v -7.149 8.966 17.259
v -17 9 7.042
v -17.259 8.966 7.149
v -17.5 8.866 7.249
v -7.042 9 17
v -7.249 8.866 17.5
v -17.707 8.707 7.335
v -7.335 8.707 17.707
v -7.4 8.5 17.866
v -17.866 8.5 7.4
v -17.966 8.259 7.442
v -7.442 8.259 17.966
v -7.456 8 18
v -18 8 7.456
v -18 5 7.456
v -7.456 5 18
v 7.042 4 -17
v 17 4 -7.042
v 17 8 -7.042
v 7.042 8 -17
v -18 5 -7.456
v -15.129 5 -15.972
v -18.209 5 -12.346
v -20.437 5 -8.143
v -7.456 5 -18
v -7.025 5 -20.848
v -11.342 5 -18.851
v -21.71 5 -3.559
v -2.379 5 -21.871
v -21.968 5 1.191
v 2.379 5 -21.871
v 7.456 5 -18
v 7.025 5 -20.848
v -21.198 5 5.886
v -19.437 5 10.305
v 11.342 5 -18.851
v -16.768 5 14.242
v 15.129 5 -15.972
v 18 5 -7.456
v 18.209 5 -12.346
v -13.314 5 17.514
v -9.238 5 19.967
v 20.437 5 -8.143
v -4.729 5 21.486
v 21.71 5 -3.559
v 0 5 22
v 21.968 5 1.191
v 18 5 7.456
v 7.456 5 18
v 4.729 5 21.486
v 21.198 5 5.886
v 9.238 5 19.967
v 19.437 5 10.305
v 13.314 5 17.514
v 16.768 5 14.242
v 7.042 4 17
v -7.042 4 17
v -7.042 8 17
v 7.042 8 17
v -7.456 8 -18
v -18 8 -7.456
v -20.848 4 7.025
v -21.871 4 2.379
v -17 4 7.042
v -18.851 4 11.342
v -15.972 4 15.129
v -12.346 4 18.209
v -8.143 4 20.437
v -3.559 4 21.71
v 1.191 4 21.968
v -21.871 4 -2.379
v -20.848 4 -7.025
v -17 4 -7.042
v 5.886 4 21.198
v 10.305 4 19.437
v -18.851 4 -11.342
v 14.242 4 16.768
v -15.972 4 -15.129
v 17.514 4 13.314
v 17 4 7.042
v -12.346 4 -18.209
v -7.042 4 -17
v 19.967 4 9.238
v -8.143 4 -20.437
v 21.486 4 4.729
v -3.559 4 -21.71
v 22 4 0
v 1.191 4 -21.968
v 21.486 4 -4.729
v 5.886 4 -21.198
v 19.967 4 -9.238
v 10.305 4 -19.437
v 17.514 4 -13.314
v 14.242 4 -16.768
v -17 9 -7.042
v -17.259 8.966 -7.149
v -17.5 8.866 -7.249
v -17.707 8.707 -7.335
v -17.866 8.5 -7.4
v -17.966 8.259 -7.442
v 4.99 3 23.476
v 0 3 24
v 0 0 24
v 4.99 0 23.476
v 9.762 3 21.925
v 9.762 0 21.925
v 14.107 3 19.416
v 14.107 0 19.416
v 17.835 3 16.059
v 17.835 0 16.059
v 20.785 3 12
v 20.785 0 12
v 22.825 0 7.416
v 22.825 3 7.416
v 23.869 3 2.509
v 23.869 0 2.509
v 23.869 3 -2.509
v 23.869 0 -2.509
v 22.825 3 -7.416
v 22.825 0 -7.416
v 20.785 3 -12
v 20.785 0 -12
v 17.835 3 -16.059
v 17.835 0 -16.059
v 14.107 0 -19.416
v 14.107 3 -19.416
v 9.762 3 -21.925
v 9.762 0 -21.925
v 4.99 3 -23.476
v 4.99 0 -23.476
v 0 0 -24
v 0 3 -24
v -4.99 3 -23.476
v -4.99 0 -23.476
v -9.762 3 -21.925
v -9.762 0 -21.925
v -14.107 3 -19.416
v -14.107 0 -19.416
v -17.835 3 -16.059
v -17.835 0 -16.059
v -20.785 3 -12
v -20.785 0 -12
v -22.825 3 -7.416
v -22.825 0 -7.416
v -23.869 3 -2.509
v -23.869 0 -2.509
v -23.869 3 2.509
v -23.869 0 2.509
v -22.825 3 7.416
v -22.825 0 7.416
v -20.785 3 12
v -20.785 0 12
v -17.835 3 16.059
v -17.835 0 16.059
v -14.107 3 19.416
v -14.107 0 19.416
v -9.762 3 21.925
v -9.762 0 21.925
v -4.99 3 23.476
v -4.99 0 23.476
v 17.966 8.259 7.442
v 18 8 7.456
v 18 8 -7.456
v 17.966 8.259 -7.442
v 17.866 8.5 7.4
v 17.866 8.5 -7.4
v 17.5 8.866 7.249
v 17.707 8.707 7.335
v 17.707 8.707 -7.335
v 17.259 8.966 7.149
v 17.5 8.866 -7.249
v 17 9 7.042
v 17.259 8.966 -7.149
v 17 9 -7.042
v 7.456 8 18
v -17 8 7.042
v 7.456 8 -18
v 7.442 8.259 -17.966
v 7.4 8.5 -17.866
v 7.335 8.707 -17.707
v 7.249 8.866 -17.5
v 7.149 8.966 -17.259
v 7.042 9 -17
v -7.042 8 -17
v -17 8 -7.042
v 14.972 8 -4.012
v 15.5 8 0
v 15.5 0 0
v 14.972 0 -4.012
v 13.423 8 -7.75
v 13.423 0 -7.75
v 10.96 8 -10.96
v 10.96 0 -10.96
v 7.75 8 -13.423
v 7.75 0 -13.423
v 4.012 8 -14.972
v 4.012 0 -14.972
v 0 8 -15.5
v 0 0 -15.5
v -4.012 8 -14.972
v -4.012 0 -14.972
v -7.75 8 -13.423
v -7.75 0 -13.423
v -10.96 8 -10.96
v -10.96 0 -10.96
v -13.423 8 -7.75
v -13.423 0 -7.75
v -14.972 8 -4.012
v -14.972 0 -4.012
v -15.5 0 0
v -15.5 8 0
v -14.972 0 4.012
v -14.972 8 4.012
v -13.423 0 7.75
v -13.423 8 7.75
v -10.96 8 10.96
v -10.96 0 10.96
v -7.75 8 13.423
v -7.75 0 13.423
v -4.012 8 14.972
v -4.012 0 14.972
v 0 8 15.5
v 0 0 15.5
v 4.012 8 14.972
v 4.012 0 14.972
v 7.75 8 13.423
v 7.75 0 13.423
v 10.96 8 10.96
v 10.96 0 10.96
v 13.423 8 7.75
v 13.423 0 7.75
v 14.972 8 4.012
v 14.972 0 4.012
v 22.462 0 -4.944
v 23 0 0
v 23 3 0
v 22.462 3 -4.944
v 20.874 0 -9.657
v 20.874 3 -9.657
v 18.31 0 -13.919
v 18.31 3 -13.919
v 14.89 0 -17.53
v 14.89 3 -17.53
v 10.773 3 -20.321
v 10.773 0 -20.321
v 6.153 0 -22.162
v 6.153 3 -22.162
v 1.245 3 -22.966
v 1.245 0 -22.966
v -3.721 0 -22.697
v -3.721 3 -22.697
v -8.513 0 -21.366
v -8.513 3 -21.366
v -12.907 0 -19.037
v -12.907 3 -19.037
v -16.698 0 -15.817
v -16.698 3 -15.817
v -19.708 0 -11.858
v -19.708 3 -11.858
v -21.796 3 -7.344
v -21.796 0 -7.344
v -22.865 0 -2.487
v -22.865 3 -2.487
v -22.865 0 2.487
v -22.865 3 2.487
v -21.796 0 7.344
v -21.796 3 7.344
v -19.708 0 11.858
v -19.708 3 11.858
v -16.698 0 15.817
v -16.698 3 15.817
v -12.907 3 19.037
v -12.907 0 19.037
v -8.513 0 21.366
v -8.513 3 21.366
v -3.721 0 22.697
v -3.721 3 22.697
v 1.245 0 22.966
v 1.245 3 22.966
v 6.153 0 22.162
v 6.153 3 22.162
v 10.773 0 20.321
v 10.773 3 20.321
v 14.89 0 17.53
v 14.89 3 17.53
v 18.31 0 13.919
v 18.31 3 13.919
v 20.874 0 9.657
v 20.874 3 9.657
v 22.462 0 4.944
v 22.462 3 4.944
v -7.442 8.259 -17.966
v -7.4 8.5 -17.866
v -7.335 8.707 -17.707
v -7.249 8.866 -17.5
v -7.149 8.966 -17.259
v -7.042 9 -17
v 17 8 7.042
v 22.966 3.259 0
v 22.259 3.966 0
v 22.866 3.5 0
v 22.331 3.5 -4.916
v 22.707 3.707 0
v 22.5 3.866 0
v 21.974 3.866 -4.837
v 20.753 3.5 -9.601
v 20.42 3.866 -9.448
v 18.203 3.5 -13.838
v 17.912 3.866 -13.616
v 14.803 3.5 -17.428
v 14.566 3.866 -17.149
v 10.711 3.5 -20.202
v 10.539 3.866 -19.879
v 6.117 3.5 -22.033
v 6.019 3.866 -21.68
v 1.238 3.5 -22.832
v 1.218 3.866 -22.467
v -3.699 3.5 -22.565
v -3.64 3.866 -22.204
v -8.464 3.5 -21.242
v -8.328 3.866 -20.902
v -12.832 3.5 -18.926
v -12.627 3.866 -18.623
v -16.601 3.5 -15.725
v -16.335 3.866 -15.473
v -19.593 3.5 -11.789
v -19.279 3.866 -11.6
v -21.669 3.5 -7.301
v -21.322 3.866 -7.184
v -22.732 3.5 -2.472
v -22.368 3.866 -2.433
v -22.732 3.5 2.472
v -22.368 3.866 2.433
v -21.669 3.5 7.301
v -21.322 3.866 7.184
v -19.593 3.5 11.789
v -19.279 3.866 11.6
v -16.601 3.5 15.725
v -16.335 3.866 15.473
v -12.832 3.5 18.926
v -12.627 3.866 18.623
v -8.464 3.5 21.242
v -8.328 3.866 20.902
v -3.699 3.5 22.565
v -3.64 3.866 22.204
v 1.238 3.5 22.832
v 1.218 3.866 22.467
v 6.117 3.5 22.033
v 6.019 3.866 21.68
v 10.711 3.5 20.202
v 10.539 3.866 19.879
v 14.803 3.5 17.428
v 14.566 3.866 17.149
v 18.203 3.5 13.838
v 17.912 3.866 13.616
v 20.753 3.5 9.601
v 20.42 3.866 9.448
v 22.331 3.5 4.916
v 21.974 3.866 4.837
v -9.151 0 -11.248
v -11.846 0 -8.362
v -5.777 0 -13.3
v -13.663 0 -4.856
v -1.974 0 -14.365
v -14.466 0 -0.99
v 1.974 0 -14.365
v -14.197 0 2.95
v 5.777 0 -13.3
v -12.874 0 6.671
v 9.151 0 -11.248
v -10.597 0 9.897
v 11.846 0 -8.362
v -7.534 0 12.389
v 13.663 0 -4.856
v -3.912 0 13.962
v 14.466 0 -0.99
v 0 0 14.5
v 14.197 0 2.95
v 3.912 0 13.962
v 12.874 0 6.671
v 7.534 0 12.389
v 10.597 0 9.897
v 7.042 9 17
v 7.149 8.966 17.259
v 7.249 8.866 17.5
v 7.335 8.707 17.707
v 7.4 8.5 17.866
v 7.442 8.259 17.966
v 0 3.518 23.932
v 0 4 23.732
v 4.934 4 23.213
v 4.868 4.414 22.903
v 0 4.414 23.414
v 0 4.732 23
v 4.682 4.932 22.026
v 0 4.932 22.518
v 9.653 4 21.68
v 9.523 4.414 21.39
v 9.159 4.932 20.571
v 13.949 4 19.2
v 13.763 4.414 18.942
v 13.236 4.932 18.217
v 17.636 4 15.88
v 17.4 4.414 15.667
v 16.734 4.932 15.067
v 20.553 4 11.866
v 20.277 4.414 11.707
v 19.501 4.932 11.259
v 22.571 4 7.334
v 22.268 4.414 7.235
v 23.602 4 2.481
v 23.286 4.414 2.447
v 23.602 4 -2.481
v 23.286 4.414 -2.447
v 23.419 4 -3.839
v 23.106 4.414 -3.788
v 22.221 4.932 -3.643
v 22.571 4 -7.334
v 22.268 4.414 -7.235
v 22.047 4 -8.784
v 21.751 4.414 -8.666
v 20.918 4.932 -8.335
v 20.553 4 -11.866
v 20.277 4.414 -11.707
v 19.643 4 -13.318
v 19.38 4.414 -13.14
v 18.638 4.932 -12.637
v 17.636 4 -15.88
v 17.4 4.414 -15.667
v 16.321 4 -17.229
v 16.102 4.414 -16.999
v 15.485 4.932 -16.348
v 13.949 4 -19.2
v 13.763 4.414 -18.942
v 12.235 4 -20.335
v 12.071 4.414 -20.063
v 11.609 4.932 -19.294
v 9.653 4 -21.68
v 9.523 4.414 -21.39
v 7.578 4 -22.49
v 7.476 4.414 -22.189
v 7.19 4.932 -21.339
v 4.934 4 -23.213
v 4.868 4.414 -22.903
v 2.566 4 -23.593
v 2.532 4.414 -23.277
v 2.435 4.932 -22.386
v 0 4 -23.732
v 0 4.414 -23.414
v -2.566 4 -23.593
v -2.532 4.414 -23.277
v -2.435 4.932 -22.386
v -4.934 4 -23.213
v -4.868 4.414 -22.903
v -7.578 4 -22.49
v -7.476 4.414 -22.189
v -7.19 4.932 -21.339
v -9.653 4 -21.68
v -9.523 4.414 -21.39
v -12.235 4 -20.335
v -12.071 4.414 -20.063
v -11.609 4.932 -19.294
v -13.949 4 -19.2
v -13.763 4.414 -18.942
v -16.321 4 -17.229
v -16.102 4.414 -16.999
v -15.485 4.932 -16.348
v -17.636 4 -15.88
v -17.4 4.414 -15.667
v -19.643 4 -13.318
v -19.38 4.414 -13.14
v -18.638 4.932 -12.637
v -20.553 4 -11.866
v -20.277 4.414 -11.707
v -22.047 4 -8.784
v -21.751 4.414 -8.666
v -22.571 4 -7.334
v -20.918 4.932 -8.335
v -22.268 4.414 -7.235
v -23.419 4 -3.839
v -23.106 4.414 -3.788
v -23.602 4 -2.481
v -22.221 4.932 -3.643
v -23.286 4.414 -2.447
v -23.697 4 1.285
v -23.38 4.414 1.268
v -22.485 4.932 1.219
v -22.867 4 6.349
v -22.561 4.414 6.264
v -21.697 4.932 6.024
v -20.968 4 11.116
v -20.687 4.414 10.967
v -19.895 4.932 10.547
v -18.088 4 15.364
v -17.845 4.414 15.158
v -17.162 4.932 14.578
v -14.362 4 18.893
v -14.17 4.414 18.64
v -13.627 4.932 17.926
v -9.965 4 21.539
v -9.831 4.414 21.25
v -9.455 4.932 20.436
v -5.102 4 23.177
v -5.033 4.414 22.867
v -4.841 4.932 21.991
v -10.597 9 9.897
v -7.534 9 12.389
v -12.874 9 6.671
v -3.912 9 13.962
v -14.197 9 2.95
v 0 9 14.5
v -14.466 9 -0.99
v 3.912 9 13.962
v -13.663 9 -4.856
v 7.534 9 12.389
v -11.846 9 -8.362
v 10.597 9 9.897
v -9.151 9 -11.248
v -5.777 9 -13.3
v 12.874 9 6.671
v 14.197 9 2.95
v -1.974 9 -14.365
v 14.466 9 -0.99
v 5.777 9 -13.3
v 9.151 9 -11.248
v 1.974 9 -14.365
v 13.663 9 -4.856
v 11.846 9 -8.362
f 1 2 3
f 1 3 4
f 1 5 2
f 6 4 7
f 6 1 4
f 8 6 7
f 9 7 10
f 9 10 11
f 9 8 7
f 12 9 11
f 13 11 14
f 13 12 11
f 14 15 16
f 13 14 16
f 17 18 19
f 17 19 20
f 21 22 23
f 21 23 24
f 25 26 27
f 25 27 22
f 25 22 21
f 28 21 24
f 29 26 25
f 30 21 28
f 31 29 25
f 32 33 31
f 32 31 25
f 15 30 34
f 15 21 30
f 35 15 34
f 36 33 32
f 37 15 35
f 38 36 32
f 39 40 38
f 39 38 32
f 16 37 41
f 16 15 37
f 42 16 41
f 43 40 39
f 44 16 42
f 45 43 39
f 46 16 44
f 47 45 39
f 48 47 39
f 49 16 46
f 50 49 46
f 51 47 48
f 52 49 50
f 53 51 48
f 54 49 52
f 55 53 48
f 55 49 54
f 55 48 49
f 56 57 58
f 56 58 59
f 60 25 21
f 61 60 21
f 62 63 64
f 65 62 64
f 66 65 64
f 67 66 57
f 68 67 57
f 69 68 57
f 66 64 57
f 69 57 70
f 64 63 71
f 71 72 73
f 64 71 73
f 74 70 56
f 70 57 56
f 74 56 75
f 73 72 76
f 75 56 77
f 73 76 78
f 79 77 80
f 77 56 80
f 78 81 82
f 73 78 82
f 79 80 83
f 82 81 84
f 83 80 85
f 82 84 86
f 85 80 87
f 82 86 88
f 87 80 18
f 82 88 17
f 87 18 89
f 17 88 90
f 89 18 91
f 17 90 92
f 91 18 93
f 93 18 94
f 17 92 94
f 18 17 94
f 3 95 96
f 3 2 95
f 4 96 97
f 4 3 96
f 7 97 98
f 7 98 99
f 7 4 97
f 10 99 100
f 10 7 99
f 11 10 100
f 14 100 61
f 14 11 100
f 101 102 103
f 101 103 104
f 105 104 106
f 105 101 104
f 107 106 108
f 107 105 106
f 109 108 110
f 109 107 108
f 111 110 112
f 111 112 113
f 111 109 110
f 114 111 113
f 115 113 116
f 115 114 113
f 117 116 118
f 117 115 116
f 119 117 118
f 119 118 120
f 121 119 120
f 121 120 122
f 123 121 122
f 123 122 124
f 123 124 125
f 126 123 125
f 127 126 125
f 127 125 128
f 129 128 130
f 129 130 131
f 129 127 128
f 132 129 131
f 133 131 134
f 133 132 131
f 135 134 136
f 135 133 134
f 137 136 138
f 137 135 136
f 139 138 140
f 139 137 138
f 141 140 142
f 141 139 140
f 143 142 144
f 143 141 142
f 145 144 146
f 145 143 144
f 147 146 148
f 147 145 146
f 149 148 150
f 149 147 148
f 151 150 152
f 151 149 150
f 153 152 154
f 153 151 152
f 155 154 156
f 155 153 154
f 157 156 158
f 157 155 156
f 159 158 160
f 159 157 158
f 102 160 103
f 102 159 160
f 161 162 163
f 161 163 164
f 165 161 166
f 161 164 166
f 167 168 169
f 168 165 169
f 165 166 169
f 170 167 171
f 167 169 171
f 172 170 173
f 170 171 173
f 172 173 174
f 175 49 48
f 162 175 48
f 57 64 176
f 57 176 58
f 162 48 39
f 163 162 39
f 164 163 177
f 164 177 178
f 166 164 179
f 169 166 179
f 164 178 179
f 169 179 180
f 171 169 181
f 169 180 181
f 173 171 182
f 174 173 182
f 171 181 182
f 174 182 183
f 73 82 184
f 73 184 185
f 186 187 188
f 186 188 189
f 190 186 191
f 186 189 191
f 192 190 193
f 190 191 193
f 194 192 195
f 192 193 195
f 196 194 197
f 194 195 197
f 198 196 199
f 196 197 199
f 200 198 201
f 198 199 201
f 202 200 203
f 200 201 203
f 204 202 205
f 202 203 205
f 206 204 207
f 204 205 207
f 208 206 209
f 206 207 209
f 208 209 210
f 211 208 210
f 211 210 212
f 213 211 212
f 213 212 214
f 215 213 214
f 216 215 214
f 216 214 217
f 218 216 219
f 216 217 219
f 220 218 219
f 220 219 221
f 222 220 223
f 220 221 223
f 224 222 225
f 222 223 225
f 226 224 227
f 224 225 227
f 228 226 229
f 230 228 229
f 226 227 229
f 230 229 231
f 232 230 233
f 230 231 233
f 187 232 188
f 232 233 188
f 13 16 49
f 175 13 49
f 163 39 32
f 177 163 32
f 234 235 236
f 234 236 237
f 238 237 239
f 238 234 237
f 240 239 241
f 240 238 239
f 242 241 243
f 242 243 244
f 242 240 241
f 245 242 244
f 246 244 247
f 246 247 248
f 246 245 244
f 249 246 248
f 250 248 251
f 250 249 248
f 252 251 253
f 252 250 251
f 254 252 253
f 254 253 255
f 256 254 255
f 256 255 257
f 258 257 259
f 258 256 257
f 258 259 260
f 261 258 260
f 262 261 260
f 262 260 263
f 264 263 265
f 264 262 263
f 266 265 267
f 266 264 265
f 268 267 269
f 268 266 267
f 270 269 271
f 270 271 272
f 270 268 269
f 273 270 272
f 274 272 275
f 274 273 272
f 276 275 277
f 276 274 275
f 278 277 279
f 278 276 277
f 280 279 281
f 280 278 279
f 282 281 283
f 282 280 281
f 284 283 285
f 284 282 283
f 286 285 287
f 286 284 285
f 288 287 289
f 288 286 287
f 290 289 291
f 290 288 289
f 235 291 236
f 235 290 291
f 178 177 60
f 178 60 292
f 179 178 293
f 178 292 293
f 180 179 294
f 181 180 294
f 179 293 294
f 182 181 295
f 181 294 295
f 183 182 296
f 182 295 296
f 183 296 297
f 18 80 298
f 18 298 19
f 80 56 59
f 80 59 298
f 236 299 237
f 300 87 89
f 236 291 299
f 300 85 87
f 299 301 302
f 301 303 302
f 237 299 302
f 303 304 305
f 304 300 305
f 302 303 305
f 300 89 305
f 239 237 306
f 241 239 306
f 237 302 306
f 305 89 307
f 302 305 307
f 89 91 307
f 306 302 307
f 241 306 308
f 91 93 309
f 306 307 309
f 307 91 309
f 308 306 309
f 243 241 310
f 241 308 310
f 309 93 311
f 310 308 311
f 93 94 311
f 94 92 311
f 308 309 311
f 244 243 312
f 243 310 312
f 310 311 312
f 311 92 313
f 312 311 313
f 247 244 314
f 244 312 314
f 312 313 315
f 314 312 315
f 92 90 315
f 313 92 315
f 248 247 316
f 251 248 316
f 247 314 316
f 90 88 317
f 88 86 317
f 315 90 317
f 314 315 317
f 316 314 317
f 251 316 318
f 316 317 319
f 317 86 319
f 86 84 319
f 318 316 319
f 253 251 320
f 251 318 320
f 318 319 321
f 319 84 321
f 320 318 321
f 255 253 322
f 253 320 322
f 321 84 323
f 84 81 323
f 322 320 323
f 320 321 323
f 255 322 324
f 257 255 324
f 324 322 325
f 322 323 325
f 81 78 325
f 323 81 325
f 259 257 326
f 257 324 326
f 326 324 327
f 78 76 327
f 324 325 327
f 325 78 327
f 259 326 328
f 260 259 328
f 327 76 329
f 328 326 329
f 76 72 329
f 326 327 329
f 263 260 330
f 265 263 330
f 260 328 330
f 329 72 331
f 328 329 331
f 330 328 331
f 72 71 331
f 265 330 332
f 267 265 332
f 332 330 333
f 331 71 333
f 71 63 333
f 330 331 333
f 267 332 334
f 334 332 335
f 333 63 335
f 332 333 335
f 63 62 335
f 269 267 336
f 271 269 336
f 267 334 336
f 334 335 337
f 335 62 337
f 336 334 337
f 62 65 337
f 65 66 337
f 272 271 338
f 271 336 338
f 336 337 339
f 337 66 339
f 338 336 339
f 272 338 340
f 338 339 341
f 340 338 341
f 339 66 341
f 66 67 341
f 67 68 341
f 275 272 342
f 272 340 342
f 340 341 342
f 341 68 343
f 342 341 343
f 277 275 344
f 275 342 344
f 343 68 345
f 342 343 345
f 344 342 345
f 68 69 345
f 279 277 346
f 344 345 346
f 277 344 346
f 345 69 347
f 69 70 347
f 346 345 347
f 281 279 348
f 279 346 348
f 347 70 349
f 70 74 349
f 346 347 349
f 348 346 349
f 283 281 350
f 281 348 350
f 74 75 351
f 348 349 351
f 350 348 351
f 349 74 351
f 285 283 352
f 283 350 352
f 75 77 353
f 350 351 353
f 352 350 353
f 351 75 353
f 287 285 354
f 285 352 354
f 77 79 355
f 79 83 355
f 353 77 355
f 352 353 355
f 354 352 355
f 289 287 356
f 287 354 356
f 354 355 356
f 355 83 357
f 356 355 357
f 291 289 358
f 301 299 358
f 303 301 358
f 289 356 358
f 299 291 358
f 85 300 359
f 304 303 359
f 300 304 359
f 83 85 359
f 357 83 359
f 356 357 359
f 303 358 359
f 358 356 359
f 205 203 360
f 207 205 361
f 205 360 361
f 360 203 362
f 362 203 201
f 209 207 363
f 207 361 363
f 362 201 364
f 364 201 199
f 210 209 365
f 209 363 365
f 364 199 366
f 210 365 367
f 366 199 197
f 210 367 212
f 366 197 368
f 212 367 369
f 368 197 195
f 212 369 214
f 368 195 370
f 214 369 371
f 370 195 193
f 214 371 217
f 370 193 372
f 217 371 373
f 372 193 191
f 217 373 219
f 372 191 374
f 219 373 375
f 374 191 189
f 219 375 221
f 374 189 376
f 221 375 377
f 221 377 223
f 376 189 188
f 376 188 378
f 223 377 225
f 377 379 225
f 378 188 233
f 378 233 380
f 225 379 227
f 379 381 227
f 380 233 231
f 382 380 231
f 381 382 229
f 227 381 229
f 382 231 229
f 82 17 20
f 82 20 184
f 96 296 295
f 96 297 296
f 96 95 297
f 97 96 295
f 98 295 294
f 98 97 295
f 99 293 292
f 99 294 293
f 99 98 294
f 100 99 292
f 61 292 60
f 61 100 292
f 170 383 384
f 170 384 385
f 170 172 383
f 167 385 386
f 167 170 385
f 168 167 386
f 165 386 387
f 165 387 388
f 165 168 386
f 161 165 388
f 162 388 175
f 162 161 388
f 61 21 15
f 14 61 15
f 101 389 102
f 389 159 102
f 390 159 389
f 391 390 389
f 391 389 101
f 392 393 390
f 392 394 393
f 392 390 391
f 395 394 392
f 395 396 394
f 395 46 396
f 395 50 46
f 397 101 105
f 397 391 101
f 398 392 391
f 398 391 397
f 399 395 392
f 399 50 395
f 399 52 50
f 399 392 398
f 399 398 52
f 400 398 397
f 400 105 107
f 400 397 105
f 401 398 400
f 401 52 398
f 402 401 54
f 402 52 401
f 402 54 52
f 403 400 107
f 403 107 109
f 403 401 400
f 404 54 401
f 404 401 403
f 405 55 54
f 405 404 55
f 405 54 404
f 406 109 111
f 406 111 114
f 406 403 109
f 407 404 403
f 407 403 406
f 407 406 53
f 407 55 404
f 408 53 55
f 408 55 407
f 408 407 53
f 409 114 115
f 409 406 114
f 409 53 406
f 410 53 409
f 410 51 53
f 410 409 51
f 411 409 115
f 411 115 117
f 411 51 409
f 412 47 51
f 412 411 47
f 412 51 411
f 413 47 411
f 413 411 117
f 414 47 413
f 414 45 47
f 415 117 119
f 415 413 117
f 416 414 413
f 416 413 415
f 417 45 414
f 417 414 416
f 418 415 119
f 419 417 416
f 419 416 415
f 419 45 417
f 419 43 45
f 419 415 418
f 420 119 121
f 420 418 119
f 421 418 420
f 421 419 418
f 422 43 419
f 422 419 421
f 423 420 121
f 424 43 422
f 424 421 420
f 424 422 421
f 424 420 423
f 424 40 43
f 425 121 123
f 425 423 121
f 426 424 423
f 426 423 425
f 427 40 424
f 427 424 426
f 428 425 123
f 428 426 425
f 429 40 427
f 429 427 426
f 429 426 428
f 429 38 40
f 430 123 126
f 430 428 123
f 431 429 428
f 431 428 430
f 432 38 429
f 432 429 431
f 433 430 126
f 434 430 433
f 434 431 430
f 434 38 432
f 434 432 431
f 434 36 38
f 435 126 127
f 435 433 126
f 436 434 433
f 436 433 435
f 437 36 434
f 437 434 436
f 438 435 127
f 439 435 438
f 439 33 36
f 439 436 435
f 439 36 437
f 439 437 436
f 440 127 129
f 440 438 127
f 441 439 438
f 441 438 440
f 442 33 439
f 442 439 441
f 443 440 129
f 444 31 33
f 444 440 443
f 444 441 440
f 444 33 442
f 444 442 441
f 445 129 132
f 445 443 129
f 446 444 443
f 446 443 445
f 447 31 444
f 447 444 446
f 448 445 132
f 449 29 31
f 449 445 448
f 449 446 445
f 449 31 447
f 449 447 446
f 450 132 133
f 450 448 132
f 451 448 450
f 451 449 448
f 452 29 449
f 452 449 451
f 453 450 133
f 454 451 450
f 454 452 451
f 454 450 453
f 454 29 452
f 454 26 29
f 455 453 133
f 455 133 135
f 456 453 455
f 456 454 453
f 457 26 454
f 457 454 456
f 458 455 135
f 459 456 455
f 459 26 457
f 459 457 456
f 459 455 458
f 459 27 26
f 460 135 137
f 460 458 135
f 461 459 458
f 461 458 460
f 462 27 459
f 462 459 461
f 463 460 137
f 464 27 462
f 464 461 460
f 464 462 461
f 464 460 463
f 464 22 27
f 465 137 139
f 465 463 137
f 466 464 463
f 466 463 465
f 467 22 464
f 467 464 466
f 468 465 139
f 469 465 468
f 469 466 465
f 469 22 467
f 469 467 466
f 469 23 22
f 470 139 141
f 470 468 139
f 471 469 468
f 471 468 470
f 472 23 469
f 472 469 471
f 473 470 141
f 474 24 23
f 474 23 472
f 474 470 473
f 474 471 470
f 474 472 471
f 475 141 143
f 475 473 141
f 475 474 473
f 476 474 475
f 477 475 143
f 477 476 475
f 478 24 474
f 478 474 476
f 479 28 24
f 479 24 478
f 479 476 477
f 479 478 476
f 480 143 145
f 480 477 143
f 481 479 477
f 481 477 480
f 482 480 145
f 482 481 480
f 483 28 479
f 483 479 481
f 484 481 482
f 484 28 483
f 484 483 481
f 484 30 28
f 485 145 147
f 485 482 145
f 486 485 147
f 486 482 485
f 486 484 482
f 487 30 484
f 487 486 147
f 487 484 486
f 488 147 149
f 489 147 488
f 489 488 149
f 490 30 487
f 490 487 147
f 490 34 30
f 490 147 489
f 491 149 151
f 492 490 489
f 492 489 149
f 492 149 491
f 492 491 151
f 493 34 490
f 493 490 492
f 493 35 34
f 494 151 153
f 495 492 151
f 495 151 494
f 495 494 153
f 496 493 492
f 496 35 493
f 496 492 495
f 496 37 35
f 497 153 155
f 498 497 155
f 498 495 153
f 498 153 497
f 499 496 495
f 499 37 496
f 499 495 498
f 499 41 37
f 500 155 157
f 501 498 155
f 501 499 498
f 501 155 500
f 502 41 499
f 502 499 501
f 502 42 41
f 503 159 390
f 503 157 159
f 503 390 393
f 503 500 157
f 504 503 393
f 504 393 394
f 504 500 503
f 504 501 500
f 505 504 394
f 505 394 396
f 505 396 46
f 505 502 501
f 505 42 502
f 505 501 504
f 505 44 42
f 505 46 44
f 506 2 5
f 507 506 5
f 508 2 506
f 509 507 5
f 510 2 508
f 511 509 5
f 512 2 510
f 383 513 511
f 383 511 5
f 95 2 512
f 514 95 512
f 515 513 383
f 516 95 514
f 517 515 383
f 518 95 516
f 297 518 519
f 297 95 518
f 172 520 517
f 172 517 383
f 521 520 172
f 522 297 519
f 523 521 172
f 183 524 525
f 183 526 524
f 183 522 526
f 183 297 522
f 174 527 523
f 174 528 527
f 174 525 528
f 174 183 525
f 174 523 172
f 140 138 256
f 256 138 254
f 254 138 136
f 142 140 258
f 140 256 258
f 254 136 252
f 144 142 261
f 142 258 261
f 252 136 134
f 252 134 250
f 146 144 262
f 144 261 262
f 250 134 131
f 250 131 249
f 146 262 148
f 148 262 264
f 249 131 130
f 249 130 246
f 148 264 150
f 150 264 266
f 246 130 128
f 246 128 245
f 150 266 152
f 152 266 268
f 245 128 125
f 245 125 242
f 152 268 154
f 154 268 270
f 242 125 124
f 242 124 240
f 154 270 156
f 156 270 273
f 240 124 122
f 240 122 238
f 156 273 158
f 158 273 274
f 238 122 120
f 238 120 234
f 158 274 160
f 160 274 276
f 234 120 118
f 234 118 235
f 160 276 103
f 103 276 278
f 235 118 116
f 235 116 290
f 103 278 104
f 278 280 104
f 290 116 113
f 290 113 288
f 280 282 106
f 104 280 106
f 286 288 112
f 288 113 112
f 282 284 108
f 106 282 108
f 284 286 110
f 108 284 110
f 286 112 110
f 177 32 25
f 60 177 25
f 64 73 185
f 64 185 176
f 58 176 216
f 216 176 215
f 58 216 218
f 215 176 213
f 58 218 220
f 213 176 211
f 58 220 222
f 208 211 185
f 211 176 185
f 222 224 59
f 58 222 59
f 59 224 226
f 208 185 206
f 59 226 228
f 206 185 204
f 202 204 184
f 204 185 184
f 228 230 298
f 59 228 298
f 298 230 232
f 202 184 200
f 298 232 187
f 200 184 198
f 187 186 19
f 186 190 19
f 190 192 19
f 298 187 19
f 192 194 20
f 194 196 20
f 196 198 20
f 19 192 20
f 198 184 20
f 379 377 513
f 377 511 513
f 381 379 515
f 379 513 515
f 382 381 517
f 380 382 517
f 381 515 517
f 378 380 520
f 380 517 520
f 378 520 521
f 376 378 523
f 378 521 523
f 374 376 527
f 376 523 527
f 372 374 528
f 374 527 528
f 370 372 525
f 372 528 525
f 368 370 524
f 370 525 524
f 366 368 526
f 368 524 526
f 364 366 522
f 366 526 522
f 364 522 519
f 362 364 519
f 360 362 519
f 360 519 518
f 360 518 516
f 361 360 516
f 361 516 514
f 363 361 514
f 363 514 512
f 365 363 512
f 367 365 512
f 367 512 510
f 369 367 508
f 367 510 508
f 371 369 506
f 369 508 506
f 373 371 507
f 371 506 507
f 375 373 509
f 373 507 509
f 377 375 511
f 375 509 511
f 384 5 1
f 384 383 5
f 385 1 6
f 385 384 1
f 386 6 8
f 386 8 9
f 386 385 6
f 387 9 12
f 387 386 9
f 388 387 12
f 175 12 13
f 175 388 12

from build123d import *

# Parameters (mm, degrees)
SALIENTE_EXTRUIR1_DEPTH = 9
CROQUIS2_R              = 14.5
CORTAR_EXTRUIR1_DEPTH   = 28
REDONDEO1_R             = 1
CROQUIS4_R              = 24
SALIENTE_EXTRUIR2_DEPTH = 5
CROQUIS5_R              = 14.5
CORTAR_EXTRUIR2_DEPTH   = 35.307433597
REDONDEO2_R             = 2
VACIADO1_OUTLINE_R      = 23
VACIADO1_OUTLINE_R_2    = 15.5
VACIADO1_DEPTH          = 2.9999999
VACIADO1_2_OUTLINE_R    = 15.5
VACIADO1_2_DEPTH        = 8


with BuildPart() as part:
    # Croquis1 → Saliente-Extruir1 (new body)
    with BuildSketch(Plane(origin=(0, 0, 0), x_dir=(1, 0, 0), z_dir=(0, 1, 0))):
        Polygon((18, 7.455844123), (7.455844123, 18), (-7.455844123, 18), (-18, 7.455844123), (-18, -7.455844123), (-7.455844123, -18), (7.455844123, -18), (18, -7.455844123), align=None)
    extrude(amount=SALIENTE_EXTRUIR1_DEPTH)

    # Croquis2 → Cortar-Extruir1 (cut, through all)
    with BuildSketch(Plane(origin=(0, 9, 0), x_dir=(1, 0, 0), z_dir=(0, 1, 0))):
        with Locations(Location((0, 0, 0), (0, 0, 270))):
            Circle(CROQUIS2_R)
    extrude(amount=-CORTAR_EXTRUIR1_DEPTH, mode=Mode.SUBTRACT)

    # Redondeo1
    redondeo1_edges = [part.edges().sort_by_distance(p)[0] for p in [
        (0, 9, -18),
        (-12.727922061, 9, -12.727922061),
        (-18, 9, 0),
        (-12.727922061, 9, 12.727922061),
        (0, 9, 18),
        (12.727922061, 9, 12.727922061),
        (18, 9, 0),
        (12.727922061, 9, -12.727922061),
    ]]
    fillet(redondeo1_edges, radius=REDONDEO1_R)

    # Croquis4 → Saliente-Extruir2 (add)
    with BuildSketch(Plane(origin=(0, 5, 0), x_dir=(1, 0, 0), z_dir=(0, 1, 0))):
        with Locations(Location((0, 0, 0), (0, 0, 270))):
            Circle(CROQUIS4_R)
    extrude(amount=-SALIENTE_EXTRUIR2_DEPTH)

    # Croquis5 → Cortar-Extruir2 (cut, through all)
    with BuildSketch(Plane(origin=(0, 5, 0), x_dir=(1, 0, 0), z_dir=(0, 1, 0))):
        with Locations(Location((0, 0, 0), (0, 0, 270))):
            Circle(CROQUIS5_R)
    extrude(amount=-CORTAR_EXTRUIR2_DEPTH, mode=Mode.SUBTRACT)

    # Redondeo2
    redondeo2_edges = [part.edges().sort_by_distance(p)[0] for p in [
        (0, 5, -24),
    ]]
    fillet(redondeo2_edges, radius=REDONDEO2_R)

    # Vaciado1: read off the stored shape, not the designer's step
    # Vaciado1 outline → Vaciado1 (cut)
    with BuildSketch(Plane(origin=(0, 0, 0), x_dir=(1, 0, 0), z_dir=(0, 1, 0))):
        Circle(VACIADO1_OUTLINE_R)
        Circle(VACIADO1_OUTLINE_R_2, mode=Mode.SUBTRACT)
    extrude(amount=VACIADO1_DEPTH, mode=Mode.SUBTRACT)

    # Vaciado1 2 outline → Vaciado1 2 (cut)
    with BuildSketch(Plane(origin=(0, 0, 0), x_dir=(1, 0, 0), z_dir=(0, 1, 0))):
        Polygon((17, -7.04163056), (17, 7.04163056), (7.04163056, 17), (-7.04163056, 17), (-17, 7.04163056), (-17, -7.04163056), (-7.04163056, -17), (7.04163056, -17), align=None)
        Circle(VACIADO1_2_OUTLINE_R, mode=Mode.SUBTRACT)
    extrude(amount=VACIADO1_2_DEPTH, mode=Mode.SUBTRACT)

    # Vaciado1 3 outline → Vaciado1 3 (revolve, cut)
    with BuildSketch(Plane.XY):
        with BuildLine():
            Line((17, 2.9999999), (23, 3))
            ThreePointArc((23, 3), (22.707106781, 3.707106781), (22, 4))
            Line((22, 4), (17, 4))
            Line((17, 4), (17, 2.9999999))
        make_face()
    revolve(axis=Axis((0, 0, 0), (0, 1, 0)), mode=Mode.SUBTRACT)


solid = part.part
